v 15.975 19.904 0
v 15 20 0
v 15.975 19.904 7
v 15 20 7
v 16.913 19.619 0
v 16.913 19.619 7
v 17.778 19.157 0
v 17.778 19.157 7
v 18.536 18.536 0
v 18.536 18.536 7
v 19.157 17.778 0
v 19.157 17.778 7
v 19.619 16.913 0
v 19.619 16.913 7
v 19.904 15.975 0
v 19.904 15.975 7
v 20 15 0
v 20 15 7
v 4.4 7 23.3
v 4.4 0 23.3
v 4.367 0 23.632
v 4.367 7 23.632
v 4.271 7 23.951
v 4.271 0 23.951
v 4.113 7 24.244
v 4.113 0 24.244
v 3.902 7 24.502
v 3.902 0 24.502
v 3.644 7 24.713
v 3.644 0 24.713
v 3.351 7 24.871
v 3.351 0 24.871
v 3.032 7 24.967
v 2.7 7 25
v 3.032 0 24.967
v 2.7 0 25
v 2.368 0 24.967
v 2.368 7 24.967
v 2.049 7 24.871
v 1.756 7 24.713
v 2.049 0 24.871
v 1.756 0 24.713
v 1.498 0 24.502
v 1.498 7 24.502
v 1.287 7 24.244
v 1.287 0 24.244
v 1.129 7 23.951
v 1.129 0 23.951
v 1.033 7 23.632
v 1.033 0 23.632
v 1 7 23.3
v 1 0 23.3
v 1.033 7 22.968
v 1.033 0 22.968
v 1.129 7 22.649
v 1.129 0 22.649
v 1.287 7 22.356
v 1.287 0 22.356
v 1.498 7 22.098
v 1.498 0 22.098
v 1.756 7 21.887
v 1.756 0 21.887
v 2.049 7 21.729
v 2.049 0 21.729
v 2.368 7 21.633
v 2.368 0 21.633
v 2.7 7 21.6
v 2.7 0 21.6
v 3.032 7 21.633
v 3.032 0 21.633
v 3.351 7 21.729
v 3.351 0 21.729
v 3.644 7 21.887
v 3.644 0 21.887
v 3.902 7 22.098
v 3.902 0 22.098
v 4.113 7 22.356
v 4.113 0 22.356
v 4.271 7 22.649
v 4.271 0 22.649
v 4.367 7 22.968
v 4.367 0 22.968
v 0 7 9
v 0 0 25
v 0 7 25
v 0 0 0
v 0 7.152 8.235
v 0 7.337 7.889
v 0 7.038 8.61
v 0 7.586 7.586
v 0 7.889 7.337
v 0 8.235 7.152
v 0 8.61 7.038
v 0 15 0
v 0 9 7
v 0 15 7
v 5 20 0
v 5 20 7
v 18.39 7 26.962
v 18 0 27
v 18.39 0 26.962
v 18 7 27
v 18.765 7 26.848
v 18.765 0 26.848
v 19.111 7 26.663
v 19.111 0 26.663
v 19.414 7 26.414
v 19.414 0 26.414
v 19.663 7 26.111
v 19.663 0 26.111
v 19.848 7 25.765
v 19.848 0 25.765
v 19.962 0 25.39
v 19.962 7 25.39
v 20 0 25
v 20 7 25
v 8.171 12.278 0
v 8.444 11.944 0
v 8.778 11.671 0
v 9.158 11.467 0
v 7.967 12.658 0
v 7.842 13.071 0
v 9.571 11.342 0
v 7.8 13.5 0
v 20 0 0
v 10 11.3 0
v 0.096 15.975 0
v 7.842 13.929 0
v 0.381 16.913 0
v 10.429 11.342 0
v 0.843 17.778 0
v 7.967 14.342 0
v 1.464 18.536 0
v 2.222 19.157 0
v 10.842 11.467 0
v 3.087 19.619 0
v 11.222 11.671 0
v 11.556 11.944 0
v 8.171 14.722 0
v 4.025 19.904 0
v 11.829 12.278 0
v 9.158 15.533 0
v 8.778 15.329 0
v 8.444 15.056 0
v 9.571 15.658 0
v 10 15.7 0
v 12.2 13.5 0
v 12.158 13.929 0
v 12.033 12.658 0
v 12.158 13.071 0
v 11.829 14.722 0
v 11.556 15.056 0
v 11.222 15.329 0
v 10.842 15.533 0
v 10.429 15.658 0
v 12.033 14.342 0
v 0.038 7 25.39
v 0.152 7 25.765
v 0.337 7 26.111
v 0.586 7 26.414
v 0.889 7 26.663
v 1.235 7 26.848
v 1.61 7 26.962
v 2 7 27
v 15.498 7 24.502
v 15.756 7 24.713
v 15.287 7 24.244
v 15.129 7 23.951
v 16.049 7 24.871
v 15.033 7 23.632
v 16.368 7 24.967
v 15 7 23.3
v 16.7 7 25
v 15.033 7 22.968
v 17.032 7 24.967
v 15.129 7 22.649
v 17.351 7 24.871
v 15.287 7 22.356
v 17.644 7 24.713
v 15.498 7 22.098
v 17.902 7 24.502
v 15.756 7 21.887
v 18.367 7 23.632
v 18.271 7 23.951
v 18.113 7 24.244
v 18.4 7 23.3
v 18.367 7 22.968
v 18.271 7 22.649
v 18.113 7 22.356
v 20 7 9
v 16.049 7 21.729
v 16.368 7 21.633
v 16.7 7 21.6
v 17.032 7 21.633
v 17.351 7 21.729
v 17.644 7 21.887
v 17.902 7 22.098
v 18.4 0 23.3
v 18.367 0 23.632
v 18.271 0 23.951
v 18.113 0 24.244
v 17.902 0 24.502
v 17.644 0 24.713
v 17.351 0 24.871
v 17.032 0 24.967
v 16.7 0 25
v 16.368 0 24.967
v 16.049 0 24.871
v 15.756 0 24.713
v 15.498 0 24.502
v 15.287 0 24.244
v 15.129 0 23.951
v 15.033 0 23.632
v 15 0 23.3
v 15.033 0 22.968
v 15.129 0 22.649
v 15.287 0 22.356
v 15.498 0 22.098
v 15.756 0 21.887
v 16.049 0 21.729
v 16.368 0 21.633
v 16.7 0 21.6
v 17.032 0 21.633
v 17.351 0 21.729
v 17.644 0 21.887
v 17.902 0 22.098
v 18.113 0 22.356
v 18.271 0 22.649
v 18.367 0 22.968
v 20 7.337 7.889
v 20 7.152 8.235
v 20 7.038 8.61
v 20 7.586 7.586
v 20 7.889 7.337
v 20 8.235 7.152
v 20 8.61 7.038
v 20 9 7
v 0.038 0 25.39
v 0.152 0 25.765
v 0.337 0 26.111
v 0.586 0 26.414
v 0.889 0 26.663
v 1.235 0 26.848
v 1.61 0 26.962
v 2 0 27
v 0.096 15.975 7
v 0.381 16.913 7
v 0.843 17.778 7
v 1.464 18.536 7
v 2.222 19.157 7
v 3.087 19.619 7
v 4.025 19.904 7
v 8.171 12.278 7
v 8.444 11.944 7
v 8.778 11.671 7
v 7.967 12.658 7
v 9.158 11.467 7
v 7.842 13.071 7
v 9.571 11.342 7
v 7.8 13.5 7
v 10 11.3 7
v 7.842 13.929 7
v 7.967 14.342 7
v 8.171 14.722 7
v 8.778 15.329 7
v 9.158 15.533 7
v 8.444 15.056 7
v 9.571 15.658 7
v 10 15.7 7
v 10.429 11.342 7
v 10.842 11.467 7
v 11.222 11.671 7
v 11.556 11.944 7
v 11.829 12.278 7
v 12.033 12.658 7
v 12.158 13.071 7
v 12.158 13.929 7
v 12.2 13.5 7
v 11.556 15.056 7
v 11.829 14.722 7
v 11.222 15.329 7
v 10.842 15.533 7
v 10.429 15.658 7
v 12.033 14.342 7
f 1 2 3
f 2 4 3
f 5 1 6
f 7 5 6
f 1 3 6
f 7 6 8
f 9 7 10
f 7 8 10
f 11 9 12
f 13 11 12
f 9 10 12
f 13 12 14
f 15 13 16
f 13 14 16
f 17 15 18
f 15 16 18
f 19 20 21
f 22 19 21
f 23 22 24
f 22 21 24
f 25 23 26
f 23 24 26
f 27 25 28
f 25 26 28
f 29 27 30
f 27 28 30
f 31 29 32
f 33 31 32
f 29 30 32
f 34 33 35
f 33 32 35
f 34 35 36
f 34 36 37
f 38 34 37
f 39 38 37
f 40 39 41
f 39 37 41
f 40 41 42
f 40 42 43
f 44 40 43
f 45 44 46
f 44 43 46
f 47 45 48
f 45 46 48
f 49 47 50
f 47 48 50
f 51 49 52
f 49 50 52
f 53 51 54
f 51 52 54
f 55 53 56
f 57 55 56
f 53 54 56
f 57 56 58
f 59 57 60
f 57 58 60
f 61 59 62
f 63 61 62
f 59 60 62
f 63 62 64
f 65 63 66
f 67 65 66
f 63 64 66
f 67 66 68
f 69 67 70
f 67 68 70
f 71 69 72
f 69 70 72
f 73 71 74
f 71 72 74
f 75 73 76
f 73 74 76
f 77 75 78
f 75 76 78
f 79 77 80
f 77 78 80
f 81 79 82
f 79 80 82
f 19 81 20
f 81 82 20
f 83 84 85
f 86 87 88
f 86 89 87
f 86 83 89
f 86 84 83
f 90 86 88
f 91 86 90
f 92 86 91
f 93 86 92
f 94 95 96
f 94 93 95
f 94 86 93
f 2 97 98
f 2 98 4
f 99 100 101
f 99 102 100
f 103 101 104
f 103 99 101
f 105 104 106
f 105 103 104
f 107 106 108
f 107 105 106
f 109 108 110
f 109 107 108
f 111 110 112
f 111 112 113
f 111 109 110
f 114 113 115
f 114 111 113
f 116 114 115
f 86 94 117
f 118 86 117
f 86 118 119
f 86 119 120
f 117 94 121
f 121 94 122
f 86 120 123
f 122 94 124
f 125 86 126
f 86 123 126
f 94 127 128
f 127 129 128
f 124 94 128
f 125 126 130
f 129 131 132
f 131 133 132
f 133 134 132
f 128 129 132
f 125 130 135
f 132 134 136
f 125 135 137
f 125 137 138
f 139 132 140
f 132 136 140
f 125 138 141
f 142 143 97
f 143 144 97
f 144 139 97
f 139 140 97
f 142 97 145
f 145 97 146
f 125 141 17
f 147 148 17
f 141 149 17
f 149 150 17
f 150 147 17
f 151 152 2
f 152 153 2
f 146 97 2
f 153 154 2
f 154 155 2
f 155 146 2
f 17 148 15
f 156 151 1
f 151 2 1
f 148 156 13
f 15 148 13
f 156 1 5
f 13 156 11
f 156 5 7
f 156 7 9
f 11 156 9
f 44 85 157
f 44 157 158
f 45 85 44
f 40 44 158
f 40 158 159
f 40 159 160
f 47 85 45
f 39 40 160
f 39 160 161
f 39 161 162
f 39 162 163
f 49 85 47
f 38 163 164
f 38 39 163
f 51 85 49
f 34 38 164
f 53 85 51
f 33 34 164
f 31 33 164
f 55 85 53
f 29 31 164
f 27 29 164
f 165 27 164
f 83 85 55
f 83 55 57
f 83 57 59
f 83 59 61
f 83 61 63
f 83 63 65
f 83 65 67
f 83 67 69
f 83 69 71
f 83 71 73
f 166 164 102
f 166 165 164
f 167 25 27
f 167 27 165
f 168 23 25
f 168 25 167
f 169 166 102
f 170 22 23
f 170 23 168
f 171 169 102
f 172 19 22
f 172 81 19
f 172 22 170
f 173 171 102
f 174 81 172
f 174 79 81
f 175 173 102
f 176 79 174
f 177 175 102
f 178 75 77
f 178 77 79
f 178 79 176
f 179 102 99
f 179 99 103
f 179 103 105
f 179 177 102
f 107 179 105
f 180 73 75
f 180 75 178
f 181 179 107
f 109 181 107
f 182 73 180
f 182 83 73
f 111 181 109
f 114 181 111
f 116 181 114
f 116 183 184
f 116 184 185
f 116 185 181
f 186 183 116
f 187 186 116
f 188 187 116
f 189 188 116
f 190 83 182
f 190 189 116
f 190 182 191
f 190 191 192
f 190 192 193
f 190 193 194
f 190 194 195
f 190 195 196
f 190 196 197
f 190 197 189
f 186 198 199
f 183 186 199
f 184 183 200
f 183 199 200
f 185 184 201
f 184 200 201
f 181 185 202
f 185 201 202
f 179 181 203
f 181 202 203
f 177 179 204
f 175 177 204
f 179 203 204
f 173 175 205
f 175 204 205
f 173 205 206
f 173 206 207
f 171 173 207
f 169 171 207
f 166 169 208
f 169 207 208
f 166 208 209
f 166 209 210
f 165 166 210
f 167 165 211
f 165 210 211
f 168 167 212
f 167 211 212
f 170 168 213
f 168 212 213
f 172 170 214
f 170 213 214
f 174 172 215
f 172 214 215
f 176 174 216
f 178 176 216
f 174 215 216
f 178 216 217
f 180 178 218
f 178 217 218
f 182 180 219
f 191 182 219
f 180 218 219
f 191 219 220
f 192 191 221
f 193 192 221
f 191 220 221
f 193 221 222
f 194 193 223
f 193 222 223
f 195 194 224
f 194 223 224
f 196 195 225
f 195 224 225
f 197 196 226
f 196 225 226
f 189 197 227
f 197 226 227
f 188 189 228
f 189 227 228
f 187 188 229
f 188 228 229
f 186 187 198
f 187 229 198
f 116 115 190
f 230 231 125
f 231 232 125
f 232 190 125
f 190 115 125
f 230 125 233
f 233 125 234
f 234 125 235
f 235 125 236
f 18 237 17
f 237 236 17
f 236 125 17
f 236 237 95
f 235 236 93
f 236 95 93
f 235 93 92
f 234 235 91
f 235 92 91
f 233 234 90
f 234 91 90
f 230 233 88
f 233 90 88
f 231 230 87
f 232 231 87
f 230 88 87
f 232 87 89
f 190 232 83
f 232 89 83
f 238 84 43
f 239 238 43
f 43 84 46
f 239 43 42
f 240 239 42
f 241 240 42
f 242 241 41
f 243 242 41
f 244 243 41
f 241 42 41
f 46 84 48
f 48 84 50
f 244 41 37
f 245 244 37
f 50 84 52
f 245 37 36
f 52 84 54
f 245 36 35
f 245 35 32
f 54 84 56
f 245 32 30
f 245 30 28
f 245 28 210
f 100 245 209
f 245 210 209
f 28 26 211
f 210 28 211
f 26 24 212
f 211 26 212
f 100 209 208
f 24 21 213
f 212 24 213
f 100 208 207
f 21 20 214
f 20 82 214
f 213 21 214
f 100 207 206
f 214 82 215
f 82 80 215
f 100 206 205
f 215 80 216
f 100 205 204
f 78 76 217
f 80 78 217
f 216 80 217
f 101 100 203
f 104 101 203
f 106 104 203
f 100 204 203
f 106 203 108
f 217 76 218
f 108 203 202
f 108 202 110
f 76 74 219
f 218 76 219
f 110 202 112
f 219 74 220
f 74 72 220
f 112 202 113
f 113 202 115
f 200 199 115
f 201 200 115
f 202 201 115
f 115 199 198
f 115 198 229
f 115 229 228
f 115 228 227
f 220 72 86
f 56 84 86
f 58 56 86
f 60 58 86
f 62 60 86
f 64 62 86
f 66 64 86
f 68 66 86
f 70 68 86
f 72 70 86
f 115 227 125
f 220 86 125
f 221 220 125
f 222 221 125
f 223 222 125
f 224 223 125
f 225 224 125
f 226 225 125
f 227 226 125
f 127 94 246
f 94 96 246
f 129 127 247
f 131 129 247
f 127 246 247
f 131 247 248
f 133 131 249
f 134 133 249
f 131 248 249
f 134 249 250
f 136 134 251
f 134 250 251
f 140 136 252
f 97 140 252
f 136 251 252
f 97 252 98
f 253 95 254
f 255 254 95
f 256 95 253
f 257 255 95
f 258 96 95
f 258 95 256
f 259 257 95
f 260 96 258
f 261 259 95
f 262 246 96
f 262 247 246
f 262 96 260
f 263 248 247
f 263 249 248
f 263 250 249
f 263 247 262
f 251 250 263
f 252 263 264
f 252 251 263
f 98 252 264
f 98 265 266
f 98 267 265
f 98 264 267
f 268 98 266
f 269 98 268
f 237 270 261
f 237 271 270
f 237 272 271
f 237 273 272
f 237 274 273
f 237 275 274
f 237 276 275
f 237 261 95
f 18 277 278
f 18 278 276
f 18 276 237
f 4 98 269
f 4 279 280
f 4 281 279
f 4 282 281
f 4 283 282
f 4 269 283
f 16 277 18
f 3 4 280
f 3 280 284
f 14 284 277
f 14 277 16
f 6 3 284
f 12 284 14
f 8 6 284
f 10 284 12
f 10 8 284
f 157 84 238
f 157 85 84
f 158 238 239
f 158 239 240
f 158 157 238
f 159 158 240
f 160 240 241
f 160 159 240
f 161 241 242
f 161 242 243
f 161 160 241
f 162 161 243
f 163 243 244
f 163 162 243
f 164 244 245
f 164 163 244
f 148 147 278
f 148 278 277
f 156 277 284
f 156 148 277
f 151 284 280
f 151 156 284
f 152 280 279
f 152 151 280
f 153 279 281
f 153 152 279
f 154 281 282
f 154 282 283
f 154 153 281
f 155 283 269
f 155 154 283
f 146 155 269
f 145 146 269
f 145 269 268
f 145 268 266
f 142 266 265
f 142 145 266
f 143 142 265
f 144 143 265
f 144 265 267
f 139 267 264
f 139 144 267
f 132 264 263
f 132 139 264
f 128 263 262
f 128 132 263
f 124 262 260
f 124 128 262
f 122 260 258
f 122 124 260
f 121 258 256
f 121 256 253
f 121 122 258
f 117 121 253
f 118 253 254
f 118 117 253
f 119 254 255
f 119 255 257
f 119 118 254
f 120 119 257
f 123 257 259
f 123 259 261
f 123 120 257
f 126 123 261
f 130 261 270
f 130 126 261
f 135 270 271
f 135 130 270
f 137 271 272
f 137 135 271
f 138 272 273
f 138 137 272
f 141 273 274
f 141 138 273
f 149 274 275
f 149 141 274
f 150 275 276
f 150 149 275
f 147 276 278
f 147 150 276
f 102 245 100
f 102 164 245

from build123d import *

# Parameters (mm, degrees)
F0_W     = 20
F0_H     = 20
F0_R     = 2.2
F1_DEPTH = 7
F2_W     = 20
F2_H     = 7
F3_DEPTH = 27
F4_R     = 1.7
F5_DEPTH = 7
F6_R     = 5
F7_R     = 2


with BuildPart() as f1:
    # F0 (on Top) → F1 (new body)
    with BuildSketch(Plane.XY):
        with Locations((10, 10)):
            Rectangle(F0_W, F0_H)
        with Locations((10, 13.5)):
            Circle(F0_R, mode=Mode.SUBTRACT)
    extrude(amount=F1_DEPTH)

    # F2 (on Top) → F3 (join)
    with BuildSketch(Plane.XY):
        with Locations((10, 3.5)):
            Rectangle(F2_W, F2_H)
    extrude(amount=F3_DEPTH)

    # F4 (on face) → F5 (cut, through all)
    with BuildSketch(Plane.XZ):
        with Locations((2.7, 23.3)):
            Circle(F4_R)
        with Locations((16.7, 23.3)):
            Circle(F4_R)
    extrude(amount=-F5_DEPTH, mode=Mode.SUBTRACT)

    # F6
    f6_edges = [f1.edges().sort_by_distance(p)[0] for p in [
        (0, 20, 3.5),
        (20, 20, 3.5),
    ]]
    fillet(f6_edges, radius=F6_R)

    # F7
    f7_edges = [f1.edges().sort_by_distance(p)[0] for p in [
        (0, 3.5, 27),
        (20, 3.5, 27),
        (10, 7, 7),
    ]]
    fillet(f7_edges, radius=F7_R)


solid = f1.part
